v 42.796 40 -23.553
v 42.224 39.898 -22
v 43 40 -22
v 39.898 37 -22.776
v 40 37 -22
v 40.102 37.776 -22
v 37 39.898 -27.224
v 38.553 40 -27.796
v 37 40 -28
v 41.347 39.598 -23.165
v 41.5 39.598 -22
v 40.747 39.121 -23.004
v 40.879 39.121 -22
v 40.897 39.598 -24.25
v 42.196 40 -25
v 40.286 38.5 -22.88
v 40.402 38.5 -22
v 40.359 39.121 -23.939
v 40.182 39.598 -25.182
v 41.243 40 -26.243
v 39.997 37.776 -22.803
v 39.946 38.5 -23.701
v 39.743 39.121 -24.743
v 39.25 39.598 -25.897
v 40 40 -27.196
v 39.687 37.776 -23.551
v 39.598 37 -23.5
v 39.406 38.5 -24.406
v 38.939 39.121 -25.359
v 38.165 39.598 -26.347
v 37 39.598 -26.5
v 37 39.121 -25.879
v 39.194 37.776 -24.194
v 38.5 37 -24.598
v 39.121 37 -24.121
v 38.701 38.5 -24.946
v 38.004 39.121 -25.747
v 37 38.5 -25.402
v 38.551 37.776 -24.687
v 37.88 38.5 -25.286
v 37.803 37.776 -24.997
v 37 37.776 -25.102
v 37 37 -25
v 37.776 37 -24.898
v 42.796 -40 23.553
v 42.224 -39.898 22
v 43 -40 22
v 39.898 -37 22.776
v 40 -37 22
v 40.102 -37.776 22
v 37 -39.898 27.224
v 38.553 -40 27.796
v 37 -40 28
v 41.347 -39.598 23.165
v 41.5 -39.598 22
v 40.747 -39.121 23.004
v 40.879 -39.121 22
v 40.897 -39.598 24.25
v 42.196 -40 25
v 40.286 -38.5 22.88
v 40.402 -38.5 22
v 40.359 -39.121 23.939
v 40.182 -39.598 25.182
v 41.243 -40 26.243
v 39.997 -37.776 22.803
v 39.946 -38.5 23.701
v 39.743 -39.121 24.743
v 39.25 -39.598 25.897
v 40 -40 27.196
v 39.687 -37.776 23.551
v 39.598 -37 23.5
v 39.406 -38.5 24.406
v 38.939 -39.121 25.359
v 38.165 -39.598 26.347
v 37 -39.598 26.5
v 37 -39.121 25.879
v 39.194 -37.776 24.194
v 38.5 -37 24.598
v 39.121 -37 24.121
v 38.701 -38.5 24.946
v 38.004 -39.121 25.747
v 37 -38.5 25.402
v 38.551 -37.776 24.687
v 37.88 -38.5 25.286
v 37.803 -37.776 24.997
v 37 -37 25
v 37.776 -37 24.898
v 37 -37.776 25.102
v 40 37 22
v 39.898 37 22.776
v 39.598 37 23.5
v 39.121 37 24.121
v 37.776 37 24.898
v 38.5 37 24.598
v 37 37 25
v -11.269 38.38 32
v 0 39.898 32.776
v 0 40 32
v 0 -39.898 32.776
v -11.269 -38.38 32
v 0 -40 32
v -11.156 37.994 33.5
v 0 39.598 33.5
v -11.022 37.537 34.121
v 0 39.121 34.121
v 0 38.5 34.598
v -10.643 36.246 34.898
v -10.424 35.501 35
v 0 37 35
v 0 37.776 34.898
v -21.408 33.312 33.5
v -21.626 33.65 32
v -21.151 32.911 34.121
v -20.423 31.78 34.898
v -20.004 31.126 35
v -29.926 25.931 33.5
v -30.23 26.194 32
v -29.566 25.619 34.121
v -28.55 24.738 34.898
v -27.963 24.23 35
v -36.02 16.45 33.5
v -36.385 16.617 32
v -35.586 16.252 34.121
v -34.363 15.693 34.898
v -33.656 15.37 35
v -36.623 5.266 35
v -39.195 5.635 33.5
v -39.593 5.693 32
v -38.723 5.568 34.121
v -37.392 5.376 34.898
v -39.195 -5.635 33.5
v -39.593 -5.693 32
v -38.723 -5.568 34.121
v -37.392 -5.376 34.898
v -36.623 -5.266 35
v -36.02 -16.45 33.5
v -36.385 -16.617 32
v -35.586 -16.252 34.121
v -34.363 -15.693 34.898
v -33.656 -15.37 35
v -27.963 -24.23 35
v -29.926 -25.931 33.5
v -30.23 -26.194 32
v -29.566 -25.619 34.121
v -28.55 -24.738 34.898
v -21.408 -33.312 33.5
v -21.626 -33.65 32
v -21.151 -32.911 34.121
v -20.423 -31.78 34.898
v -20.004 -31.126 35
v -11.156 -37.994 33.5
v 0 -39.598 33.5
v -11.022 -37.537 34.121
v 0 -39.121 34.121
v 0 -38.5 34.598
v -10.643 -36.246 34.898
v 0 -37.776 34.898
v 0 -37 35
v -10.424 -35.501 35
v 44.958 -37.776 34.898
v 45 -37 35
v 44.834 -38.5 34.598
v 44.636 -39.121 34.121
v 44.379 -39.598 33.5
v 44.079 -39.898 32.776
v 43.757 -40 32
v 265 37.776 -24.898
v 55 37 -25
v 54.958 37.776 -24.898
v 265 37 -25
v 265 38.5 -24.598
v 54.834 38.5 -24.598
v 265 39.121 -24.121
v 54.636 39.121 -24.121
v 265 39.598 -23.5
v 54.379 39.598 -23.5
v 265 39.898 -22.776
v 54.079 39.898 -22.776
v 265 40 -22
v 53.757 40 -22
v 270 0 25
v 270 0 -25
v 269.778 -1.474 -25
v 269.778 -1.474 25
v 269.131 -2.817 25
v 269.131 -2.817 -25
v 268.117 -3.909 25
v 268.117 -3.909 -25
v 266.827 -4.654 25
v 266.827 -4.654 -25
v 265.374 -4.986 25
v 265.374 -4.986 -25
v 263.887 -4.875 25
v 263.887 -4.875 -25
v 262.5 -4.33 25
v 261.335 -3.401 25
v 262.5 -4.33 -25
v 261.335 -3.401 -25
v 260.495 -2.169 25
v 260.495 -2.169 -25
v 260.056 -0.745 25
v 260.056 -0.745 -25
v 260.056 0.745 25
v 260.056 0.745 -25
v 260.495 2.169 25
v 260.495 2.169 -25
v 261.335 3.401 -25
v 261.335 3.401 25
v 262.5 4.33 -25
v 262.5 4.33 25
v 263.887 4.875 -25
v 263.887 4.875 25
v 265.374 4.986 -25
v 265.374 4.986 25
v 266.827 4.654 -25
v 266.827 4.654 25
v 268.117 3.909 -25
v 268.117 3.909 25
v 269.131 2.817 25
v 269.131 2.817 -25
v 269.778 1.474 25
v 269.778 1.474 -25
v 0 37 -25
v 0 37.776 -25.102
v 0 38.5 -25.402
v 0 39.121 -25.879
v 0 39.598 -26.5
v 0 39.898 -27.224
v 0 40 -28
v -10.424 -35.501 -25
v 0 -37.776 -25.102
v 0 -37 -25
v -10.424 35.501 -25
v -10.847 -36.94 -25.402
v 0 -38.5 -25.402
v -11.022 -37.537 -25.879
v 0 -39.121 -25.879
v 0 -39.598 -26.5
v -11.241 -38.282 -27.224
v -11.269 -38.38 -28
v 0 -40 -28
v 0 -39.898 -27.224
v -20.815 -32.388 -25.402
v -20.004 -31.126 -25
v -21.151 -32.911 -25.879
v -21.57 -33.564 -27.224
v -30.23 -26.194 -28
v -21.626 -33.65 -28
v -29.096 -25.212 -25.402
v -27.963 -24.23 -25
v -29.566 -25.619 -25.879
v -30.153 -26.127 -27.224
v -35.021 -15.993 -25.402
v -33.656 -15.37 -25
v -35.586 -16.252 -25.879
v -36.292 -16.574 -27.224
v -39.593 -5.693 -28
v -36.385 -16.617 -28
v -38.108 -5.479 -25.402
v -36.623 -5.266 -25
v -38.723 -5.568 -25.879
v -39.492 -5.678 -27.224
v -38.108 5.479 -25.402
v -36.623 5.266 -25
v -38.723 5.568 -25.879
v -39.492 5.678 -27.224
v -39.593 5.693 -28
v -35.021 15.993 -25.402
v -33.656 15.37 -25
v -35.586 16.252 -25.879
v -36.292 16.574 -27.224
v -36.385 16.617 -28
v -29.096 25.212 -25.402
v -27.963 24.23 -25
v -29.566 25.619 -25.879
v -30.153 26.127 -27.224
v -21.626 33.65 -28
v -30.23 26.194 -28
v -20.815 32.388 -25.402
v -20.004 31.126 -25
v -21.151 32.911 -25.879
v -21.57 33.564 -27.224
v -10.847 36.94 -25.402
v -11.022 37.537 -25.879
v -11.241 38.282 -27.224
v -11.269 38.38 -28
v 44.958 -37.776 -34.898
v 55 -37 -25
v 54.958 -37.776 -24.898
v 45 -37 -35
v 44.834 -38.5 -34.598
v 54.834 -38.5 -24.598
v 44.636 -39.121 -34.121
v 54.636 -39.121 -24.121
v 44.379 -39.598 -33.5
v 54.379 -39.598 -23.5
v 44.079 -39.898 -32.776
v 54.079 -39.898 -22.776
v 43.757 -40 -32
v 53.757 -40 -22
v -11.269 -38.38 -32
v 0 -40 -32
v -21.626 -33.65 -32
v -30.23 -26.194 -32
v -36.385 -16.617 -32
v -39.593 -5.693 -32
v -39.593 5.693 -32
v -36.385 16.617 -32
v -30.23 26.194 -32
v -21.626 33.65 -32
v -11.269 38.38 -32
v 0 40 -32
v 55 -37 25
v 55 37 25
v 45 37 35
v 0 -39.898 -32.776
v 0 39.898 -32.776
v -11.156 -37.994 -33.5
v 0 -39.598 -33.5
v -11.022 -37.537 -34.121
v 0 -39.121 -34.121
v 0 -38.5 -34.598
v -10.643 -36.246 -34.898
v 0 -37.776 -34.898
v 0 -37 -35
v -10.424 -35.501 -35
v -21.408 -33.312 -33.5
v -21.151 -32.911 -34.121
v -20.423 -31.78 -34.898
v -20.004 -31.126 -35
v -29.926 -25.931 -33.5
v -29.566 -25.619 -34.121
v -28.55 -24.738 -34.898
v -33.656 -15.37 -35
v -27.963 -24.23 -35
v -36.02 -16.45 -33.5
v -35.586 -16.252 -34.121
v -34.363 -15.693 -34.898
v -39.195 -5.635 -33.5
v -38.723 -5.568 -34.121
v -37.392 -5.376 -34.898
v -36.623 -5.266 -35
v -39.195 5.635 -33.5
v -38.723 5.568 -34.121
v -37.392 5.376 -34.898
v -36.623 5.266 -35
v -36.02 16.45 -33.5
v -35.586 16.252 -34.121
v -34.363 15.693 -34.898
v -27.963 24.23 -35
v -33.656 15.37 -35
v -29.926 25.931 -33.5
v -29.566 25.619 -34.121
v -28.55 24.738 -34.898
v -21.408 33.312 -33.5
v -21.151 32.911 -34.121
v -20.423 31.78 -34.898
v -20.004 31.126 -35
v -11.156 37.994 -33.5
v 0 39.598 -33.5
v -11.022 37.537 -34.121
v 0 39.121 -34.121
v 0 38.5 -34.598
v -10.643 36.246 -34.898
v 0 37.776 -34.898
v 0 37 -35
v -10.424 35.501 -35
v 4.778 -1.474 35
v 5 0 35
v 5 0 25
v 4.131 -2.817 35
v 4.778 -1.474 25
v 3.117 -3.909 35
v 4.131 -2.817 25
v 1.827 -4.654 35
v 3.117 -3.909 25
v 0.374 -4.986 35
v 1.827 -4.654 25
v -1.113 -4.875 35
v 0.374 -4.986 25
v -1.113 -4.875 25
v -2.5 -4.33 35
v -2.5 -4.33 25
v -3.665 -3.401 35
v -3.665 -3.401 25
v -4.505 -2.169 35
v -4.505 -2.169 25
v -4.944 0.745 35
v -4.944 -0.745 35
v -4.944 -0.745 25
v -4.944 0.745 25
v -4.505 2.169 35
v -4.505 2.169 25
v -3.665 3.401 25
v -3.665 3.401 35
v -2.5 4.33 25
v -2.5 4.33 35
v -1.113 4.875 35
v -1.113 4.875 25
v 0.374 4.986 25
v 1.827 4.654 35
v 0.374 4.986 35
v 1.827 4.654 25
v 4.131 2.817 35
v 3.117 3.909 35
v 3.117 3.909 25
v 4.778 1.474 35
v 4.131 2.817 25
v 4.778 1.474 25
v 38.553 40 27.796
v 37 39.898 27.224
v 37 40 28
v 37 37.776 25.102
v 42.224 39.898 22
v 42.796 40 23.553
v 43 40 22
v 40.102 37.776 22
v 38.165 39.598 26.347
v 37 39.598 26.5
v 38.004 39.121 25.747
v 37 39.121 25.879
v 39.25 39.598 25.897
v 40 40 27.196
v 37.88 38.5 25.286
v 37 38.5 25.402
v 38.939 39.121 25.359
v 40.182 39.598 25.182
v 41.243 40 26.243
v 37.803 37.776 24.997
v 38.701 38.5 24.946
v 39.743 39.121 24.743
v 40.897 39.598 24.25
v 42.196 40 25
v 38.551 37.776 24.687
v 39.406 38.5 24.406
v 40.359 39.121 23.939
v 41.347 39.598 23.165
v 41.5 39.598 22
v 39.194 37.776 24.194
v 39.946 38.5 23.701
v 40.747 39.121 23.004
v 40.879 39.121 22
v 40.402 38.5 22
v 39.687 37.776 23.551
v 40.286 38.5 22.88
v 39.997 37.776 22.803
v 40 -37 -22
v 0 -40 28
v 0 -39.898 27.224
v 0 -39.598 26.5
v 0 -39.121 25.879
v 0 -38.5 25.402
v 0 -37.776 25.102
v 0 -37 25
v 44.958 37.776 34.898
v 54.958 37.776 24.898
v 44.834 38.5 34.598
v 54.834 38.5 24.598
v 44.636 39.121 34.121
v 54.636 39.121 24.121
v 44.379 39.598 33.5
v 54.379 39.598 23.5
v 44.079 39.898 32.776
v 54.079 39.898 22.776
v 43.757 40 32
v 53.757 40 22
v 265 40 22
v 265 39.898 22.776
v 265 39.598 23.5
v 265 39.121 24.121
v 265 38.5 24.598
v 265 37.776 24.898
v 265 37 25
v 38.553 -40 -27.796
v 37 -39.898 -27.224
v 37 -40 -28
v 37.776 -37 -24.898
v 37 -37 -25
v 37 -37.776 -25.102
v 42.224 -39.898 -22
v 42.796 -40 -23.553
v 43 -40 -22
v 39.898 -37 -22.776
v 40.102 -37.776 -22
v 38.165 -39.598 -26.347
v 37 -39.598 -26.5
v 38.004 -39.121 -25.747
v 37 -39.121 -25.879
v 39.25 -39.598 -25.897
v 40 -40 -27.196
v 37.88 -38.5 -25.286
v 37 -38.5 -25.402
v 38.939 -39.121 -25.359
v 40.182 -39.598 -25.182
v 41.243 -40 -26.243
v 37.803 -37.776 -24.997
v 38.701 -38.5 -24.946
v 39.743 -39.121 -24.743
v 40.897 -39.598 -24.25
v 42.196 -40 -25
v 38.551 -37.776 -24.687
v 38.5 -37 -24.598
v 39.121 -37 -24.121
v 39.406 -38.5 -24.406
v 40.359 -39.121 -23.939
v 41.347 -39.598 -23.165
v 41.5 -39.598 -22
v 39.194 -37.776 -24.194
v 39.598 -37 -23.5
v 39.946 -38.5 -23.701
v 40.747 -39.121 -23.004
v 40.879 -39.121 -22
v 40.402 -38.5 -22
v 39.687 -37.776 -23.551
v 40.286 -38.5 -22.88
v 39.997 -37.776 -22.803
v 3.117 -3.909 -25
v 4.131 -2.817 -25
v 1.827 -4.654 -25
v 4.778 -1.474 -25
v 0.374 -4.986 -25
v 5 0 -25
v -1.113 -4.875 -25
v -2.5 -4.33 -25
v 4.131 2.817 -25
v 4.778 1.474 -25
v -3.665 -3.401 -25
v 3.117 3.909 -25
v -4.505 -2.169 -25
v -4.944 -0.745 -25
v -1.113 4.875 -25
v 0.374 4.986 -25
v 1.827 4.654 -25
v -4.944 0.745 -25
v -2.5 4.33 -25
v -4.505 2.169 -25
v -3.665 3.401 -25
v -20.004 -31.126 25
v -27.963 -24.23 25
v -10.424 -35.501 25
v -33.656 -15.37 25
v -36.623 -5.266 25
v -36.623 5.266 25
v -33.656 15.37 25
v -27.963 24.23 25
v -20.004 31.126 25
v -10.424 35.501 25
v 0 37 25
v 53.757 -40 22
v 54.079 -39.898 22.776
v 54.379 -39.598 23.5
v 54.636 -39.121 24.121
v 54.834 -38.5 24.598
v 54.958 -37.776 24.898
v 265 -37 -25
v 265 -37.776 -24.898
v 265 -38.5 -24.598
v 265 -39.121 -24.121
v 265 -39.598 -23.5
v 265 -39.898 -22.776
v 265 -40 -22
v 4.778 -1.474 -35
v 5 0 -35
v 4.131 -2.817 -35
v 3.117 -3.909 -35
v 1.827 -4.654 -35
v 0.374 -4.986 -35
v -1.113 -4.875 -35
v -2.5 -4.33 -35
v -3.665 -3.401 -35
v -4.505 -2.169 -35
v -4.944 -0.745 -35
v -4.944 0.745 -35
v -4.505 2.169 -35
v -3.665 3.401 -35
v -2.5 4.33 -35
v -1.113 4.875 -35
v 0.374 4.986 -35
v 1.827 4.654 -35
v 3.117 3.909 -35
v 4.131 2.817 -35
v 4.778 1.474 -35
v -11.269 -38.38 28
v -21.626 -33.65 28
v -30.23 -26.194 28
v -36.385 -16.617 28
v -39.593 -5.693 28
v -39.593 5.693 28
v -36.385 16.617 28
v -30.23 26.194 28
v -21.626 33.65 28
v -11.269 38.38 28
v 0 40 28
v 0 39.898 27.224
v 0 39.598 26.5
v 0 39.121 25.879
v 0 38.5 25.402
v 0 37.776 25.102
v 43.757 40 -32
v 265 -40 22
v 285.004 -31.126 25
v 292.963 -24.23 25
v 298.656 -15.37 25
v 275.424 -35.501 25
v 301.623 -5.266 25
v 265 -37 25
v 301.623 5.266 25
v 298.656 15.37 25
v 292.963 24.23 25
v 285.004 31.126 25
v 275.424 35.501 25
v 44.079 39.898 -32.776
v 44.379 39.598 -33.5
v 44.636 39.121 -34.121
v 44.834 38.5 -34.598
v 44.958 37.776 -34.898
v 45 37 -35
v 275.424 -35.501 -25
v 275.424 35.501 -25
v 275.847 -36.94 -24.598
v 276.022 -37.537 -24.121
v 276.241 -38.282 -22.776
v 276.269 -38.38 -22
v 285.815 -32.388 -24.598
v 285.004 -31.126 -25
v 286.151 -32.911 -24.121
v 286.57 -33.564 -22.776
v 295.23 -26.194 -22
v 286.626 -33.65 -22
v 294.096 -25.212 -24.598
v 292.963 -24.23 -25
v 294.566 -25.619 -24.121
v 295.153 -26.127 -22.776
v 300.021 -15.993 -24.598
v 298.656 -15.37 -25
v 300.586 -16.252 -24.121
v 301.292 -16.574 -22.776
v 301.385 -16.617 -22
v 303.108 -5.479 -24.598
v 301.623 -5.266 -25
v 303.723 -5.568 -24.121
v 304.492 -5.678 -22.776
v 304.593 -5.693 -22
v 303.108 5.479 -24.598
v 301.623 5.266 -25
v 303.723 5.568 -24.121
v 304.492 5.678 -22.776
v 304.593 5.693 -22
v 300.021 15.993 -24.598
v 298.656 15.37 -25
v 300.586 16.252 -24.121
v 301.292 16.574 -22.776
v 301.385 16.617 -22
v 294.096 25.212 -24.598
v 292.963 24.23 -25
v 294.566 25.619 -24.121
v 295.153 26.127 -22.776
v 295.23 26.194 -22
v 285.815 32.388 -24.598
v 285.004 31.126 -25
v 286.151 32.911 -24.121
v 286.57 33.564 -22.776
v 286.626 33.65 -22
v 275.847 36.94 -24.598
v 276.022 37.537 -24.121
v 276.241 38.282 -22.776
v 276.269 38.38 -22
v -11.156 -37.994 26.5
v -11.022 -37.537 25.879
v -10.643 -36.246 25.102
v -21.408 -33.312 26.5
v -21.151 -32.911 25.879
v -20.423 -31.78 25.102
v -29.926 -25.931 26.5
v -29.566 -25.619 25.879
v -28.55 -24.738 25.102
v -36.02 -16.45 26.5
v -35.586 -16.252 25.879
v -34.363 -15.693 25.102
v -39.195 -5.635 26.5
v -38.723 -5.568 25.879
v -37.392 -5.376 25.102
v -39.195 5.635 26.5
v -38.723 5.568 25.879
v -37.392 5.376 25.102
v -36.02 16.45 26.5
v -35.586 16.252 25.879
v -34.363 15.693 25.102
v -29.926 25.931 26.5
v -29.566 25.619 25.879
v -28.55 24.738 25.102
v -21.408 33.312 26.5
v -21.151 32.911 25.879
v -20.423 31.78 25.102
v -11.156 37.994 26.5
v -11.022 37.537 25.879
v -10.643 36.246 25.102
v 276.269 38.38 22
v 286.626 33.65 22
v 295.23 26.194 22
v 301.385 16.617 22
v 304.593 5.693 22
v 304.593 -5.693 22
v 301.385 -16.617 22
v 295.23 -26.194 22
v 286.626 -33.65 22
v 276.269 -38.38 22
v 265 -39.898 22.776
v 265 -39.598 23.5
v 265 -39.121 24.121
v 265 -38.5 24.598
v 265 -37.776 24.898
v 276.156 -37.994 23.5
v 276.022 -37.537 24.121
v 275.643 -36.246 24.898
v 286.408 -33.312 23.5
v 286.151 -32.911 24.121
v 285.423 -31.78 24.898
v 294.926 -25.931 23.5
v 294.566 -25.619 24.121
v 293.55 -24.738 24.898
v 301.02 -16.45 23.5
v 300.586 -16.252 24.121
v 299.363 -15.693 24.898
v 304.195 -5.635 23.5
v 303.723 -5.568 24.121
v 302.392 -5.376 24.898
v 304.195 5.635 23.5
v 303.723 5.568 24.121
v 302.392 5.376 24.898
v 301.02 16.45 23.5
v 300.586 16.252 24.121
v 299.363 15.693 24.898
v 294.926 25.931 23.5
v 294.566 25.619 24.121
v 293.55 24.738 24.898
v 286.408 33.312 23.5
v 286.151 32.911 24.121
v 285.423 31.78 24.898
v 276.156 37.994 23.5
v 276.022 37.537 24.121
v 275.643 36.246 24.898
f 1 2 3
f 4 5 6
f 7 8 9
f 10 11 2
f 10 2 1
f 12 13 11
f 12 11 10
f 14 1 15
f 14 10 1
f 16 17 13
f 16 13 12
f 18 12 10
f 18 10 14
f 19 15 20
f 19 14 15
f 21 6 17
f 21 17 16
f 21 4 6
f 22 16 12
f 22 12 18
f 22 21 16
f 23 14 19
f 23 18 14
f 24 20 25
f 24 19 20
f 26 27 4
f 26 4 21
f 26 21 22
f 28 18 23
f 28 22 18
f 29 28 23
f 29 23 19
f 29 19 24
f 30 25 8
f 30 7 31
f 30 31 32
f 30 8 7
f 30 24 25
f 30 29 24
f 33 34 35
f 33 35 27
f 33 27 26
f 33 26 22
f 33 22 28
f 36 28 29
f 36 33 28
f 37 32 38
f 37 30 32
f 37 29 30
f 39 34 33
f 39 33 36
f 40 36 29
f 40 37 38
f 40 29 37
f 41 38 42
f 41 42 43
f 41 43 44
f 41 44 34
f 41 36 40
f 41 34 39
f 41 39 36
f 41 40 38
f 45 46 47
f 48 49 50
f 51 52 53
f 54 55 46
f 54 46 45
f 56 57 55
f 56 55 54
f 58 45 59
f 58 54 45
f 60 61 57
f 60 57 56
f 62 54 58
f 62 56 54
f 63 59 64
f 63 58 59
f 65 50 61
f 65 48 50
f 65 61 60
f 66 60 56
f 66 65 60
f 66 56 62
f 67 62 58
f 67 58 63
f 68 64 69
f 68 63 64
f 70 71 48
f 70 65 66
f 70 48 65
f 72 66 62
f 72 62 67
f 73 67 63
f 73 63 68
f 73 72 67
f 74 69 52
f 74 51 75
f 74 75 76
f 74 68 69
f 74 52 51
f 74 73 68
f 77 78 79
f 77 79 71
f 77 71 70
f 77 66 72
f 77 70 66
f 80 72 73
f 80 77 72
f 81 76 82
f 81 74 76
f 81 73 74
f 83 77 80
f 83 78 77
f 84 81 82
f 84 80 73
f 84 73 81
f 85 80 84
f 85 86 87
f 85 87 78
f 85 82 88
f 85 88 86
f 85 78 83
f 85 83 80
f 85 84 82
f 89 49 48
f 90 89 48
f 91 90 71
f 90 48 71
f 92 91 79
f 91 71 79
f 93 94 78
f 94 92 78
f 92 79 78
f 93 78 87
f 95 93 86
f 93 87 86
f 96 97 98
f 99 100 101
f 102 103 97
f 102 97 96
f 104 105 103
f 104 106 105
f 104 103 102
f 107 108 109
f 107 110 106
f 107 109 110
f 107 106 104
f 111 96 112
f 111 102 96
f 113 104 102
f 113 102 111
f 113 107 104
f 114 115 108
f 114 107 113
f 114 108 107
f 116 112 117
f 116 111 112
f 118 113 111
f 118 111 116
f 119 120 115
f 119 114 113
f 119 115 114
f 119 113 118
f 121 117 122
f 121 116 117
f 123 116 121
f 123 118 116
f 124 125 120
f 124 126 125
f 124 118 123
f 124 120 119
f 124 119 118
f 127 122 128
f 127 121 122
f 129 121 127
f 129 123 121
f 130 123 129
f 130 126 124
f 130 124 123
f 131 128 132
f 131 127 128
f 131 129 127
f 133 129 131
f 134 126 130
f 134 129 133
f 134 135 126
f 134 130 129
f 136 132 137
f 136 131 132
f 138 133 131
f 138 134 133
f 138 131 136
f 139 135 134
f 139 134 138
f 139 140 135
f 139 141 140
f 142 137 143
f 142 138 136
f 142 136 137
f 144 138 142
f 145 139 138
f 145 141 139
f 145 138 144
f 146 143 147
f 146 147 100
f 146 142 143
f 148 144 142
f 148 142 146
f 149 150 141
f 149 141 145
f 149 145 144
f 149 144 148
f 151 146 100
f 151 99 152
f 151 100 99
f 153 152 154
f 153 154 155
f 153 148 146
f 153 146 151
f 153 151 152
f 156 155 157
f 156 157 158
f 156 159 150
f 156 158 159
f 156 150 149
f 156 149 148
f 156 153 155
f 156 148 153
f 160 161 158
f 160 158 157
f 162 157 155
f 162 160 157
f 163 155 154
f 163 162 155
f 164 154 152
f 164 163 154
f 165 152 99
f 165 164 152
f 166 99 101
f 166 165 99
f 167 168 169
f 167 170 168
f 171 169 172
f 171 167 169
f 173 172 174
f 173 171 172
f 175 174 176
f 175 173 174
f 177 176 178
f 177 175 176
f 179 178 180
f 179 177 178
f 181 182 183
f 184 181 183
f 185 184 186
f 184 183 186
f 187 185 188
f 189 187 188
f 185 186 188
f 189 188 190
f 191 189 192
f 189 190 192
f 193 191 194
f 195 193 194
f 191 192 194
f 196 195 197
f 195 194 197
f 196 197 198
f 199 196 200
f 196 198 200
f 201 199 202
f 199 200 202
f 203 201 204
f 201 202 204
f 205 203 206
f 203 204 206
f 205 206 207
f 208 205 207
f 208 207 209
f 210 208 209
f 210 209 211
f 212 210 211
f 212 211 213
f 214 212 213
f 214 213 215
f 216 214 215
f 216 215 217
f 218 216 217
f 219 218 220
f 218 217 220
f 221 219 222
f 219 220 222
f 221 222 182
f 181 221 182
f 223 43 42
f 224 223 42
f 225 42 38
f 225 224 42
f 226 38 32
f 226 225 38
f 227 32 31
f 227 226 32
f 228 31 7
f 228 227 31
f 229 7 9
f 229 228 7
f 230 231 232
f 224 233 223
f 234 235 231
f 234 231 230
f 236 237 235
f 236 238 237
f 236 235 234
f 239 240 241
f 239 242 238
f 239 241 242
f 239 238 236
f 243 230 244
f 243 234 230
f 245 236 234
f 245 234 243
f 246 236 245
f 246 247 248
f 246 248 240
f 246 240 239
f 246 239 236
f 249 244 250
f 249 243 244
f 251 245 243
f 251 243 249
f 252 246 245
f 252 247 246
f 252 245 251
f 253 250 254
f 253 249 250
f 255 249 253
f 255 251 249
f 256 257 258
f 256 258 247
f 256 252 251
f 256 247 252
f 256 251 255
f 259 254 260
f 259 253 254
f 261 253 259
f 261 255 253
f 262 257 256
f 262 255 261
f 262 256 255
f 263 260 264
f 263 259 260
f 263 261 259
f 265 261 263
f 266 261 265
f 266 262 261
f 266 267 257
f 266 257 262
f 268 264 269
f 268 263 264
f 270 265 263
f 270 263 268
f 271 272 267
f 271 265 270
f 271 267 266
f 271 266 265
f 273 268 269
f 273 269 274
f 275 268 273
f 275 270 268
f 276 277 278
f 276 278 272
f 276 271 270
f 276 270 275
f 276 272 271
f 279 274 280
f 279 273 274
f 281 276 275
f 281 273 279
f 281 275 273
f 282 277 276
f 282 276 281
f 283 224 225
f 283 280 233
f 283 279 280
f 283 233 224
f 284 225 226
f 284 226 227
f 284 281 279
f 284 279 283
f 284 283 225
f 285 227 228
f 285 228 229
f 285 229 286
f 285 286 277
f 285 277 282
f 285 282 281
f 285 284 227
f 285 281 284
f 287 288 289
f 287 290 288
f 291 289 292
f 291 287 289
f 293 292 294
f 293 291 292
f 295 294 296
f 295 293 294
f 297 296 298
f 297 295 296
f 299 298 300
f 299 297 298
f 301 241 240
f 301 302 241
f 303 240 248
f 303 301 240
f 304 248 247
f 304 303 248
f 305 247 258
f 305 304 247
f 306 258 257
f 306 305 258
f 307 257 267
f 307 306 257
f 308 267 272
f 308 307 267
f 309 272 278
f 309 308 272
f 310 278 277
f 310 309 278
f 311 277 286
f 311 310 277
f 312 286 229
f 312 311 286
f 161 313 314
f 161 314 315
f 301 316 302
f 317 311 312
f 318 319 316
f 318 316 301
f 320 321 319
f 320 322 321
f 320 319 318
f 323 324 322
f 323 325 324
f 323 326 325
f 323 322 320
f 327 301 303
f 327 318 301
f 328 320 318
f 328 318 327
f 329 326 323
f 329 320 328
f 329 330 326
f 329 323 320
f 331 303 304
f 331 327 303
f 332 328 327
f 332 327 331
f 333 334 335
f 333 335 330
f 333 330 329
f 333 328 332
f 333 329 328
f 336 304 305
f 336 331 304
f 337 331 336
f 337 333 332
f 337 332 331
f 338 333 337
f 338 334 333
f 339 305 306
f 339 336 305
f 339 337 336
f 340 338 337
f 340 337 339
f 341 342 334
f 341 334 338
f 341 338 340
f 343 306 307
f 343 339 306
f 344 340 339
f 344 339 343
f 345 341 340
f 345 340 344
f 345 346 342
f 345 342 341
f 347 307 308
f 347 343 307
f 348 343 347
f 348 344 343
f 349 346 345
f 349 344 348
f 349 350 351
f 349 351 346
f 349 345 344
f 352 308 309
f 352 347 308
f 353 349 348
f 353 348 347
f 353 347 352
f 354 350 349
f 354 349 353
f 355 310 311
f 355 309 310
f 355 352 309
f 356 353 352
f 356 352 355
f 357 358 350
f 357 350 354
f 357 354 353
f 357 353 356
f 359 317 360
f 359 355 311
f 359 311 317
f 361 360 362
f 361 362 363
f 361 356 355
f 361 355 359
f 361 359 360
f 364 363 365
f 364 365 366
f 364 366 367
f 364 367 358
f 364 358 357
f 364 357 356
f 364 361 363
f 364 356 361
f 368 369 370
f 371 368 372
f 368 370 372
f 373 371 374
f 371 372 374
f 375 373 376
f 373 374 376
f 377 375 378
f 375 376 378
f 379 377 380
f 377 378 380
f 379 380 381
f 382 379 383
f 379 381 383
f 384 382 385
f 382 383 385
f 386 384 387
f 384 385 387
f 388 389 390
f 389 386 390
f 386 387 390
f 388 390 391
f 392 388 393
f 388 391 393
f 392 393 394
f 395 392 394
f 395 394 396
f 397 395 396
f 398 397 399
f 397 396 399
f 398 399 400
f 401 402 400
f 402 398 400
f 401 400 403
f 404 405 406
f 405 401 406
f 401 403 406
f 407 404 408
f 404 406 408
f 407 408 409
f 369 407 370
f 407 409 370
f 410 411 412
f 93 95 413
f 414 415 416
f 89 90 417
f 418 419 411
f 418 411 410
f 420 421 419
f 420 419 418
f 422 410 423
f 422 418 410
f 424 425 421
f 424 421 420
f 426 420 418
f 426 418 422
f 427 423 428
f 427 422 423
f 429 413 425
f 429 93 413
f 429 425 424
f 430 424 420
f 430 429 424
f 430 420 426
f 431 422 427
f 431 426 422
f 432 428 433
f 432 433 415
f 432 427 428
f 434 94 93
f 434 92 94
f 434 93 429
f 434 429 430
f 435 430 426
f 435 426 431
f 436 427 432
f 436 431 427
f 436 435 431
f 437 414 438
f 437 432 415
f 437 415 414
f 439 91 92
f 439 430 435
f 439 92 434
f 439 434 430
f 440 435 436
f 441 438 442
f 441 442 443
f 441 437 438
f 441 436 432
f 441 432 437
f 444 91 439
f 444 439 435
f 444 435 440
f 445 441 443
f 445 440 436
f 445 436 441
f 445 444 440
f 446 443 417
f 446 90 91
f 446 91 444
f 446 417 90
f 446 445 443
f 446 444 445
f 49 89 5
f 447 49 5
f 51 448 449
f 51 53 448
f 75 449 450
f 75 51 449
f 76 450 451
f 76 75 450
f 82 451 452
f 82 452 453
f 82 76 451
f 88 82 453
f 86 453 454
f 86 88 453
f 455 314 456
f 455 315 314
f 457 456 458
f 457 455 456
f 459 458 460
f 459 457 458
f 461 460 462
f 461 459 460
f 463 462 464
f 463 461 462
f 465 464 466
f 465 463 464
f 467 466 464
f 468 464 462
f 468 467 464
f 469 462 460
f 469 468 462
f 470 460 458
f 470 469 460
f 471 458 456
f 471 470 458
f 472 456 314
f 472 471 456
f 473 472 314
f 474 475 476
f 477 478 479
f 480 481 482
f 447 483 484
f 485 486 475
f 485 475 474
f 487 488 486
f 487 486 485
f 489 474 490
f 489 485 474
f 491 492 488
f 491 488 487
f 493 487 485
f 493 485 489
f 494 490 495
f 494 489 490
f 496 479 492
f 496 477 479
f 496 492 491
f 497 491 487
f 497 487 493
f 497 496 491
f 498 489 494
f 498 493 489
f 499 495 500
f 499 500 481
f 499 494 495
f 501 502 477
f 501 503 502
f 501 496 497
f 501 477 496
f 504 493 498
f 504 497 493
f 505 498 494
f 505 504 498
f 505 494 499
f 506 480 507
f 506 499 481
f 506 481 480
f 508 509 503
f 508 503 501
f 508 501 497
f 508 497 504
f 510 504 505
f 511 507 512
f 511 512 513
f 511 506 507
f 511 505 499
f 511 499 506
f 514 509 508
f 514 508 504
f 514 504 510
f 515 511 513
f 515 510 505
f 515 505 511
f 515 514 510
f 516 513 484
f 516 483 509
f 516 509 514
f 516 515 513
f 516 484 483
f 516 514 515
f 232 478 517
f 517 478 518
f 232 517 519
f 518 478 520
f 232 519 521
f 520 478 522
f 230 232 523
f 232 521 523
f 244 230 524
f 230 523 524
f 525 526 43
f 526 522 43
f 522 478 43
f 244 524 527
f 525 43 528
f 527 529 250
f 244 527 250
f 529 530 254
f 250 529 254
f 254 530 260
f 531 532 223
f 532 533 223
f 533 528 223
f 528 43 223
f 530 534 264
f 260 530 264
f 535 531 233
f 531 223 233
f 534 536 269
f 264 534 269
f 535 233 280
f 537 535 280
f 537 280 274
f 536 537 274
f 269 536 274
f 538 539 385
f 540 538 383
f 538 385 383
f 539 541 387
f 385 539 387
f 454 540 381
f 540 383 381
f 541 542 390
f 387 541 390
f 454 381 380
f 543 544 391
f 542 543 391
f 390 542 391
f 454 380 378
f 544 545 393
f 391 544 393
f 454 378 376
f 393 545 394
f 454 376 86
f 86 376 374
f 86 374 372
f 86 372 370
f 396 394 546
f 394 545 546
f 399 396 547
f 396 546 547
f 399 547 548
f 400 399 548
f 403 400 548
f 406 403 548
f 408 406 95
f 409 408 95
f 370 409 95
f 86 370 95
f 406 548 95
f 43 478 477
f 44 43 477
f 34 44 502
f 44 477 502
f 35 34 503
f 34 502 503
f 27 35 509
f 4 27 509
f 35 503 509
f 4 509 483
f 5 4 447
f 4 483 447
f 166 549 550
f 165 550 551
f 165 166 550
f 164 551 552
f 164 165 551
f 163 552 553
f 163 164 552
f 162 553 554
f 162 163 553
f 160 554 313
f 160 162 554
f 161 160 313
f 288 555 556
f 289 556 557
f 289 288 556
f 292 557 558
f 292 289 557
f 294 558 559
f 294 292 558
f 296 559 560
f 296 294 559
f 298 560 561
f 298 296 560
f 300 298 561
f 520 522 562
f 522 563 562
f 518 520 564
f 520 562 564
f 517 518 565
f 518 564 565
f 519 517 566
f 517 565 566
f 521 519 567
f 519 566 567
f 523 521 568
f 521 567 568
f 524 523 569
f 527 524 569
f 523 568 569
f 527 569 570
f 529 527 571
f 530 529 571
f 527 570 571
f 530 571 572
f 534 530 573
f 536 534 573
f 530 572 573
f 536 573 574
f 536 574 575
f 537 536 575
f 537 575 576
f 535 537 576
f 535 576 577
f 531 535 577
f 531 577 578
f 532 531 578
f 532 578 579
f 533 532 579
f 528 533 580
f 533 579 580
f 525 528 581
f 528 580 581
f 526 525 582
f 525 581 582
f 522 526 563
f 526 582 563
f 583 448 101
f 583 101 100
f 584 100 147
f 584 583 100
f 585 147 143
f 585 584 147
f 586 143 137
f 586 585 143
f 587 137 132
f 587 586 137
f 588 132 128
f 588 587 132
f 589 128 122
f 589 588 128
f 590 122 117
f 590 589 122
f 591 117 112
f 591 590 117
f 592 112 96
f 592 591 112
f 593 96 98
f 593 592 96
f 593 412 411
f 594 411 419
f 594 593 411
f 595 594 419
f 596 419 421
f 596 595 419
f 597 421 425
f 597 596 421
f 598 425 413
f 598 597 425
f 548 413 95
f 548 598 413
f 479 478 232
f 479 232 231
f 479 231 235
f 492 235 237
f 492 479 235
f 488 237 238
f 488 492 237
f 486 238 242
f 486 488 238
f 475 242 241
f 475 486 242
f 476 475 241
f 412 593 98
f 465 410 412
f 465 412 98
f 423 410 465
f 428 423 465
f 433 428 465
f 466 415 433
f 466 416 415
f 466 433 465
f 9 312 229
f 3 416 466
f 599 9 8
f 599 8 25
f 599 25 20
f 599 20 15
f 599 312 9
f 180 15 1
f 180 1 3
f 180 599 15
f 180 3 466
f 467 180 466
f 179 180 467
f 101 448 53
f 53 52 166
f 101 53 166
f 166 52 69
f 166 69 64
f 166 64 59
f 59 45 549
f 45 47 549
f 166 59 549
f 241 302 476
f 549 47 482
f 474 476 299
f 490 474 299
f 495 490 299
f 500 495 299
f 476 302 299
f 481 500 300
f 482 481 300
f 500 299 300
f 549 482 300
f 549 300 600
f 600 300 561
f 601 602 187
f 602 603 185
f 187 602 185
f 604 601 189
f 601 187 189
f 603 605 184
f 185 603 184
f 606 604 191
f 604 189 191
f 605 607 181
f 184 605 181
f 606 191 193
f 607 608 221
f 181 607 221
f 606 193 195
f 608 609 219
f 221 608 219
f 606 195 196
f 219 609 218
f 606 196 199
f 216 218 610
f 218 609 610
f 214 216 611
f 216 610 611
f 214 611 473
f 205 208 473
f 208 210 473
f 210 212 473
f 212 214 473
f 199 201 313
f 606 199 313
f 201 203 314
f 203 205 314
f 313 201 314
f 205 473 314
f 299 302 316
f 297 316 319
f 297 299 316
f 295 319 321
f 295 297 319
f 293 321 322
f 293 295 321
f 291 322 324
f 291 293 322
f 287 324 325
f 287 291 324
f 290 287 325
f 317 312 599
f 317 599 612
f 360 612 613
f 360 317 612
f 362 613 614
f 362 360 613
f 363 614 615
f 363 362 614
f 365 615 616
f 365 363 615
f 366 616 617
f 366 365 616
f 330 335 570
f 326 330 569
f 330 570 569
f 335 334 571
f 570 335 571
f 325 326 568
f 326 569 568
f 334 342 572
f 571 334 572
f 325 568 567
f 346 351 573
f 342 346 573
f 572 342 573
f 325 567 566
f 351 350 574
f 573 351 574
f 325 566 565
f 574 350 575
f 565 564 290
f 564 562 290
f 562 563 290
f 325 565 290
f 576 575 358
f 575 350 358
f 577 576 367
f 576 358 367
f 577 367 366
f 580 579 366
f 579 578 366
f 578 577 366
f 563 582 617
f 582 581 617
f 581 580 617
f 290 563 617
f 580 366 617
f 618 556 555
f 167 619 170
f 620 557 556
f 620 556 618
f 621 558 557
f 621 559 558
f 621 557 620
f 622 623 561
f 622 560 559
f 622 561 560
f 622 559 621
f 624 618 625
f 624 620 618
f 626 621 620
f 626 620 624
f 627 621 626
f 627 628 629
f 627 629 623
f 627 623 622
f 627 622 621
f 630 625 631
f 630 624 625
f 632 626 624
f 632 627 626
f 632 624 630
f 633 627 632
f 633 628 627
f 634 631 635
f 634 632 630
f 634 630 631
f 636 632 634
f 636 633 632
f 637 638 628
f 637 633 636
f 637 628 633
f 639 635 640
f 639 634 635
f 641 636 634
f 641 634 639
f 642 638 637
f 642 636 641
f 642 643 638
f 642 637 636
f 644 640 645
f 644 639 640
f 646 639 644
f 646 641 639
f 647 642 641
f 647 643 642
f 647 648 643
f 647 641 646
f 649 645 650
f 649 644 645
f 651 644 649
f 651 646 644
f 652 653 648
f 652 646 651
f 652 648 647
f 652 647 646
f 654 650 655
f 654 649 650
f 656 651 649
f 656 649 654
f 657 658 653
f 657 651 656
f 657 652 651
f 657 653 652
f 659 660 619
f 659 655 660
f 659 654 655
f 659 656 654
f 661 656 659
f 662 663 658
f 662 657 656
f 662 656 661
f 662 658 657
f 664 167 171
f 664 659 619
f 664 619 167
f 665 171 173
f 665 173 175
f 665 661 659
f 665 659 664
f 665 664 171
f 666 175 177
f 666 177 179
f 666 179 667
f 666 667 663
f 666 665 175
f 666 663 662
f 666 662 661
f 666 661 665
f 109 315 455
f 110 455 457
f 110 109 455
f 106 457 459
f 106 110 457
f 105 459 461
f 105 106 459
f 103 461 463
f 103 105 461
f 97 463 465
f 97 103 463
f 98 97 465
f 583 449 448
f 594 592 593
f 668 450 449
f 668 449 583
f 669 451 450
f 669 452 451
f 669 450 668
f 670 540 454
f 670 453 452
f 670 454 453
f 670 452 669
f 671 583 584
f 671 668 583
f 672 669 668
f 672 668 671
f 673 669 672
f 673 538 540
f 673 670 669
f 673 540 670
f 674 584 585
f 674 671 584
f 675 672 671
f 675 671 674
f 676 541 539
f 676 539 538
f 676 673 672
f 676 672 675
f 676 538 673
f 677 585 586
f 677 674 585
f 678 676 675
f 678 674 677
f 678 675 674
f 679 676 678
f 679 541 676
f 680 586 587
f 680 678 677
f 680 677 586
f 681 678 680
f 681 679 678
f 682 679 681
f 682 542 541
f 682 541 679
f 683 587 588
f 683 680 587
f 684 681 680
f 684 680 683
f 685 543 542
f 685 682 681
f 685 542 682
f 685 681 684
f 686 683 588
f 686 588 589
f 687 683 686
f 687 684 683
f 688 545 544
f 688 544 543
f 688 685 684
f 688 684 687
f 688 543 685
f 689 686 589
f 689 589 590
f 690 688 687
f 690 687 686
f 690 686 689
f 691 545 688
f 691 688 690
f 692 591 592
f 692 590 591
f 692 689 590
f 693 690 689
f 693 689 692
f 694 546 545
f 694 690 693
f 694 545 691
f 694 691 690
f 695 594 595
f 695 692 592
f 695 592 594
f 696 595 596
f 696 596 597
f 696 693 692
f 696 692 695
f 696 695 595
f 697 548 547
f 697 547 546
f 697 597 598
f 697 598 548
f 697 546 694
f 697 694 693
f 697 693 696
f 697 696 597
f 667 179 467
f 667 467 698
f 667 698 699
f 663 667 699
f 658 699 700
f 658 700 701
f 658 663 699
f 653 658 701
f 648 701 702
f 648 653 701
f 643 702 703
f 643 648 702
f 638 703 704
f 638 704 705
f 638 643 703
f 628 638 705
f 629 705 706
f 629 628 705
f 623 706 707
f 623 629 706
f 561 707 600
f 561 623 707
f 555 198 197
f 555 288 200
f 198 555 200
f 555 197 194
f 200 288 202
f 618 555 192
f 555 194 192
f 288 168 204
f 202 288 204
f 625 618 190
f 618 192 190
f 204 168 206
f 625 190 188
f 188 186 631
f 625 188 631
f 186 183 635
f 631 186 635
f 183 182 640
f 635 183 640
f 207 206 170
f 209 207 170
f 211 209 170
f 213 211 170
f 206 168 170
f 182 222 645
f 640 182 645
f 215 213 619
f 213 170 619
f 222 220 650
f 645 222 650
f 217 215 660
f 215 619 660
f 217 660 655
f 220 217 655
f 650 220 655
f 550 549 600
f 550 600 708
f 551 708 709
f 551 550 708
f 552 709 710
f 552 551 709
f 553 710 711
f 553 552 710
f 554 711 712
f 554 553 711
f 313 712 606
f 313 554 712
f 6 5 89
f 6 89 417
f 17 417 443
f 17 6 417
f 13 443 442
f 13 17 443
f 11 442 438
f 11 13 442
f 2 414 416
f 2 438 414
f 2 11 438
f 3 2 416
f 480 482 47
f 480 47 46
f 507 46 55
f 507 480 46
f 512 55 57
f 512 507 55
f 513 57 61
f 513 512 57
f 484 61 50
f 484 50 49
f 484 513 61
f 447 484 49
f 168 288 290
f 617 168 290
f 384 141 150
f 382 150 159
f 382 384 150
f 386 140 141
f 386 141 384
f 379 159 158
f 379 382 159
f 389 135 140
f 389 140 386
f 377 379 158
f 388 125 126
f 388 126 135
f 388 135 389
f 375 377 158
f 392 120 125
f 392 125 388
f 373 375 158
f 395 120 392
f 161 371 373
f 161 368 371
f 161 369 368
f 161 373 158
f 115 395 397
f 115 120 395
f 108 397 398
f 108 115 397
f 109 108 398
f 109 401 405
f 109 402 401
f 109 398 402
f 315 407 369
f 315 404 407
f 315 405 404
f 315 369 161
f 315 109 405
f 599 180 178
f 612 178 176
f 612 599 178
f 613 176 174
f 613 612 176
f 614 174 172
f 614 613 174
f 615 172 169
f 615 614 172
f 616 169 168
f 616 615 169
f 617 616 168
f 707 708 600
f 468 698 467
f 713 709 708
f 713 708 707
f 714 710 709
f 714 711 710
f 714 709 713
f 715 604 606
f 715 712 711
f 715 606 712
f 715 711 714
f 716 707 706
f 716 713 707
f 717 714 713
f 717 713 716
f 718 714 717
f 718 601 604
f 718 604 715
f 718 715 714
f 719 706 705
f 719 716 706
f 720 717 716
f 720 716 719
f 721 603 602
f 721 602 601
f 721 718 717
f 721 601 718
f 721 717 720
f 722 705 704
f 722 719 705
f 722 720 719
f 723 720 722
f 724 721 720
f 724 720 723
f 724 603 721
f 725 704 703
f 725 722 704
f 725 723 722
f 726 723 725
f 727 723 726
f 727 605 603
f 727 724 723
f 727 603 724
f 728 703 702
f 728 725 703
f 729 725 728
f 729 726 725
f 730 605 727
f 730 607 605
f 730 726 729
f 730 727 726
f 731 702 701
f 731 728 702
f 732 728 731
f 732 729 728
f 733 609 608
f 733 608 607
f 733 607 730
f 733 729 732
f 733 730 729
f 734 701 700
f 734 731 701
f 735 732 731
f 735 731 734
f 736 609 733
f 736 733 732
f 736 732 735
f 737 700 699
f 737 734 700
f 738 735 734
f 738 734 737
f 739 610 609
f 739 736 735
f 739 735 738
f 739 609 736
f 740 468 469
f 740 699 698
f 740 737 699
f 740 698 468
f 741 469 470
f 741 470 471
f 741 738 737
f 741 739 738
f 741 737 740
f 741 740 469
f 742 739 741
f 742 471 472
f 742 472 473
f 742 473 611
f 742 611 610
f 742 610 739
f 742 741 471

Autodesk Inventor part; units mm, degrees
ref_plane "YZ Plane" through (0, 0, 0) normal (1, 0, 0) x (0, 1, 0)
ref_plane "XZ Plane" through (0, 0, 0) normal (0, 1, 0) x (-1, 0, 0)
ref_plane "XY Plane" through (0, 0, 0) normal (0, 0, 1) x (1, 0, 0)
sketch "Sketch1" plane through (0, 0, 0) normal (0, 0, 1) x (1, 0, 0)
  arc A0 (0, 40) -> (0, -40) centre (0, 0) ccw
  arc A1 (265, -40) -> (265, 40) centre (265, 0) ccw
  line L0 (0, 0) -> (265, 0) construction
  line L1 (0, 40) -> (265, 40)
  line L2 (0, -40) -> (265, -40)
  arc A2 (40, 0) -> (0, 40) centre (0, 0) ccw construction
  arc A3 (0, -40) -> (40, 0) centre (0, 0) ccw construction
  arc A4 (225, 0) -> (265, -40) centre (265, 0) ccw construction
  arc A5 (265, 40) -> (225, 0) centre (265, 0) ccw construction
  circle A6 centre (0, 0) radius 5
  circle A7 centre (265, 0) radius 5
  dimension "d0" = 80
  dimension "d1" = 80
  dimension "d2" = 265
  dimension "d3" = 10
  dimension "d4" = 10
extrude "Extrusion1" add sketch "Sketch1" along normal mid plane 70
sketch "Sketch2" plane through (0, 40, 35) normal (0, 1, 0) x (1, 0, 0)
  line L0 (-40, 0) -> (0, 0) construction
  line L1 (-40, 0) -> (45, 0) construction
  line L2 (45, 70) -> (45, 69.4311) construction
  line L3 (305, 70) -> (305, 0) construction
  line L4 (55, 10) -> (305, 10) construction
  line L5 (305, 10) -> (305, 60) construction
  line L6 (305, 60) -> (55, 60) construction
  line L7 (45, 60) -> (45, 10) construction
  line L8 (0, 70) -> (265, 70) construction
  line L9 (265, 0) -> (0, 0) construction
  line L10 (45, 60) -> (305, 60) construction
  line L11 (305, 60) -> (305, 70)
  line L12 (305, 70) -> (45, 70)
  line L13 (45, 70) -> (45, 60) construction
  line L14 (45, 10) -> (305, 10) construction
  line L15 (305, 10) -> (305, 0)
  line L16 (305, 0) -> (45, 0)
  line L17 (45, 0) -> (45, 0)
  line L18 (55, 60) -> (45, 70)
  line L19 (55, 10) -> (45, 0)
  line L20 (55, 60) -> (305, 60)
  line L21 (305, 10) -> (50, 10)
  line L22 (-40, 70) -> (-40, 0) projected
  line L23 (-40, 10) -> (40, 10)
  line L24 (40, 10) -> (40, 60)
  line L25 (40, 60) -> (-40, 60)
  line L26 (-40, 60) -> (-40, 10)
  point P0 (0, 35)
  point P1 (45, 70)
  point P2 (45, 0)
  point P3 (55, 10)
  dimension "d7" = 85
  dimension "d8" = 10
  dimension "d9" = 10
  dimension "d10" = 10
  dimension "d11" = 10
  dimension "d12" = 10
  dimension "d13" = 10
  dimension "d14" = 80
extrude "Extrusion2" cut sketch "Sketch2" against normal through all
fillet "Fillet1" radius 3 26 edges at (305, 0, 25) (160, -40, 25) (160, 40, 25) (305, 0, -25) (160, -40, -25) (160, 40, -25) (-40, 0, 35) (22.5, -40, 35) (22.5, 40, 35) (-40, 0, 25) (20, -40, 25) (20, 40, 25) (-40, 0, -25) (20, -40, -25) (20, 40, -25) (-40, 0, -35) (22.5, -40, -35) (22.5, 40, -35) (40, 40, 0) (40, -40, 0) (50, -40, 30) (50, 40, 30) (50, 40, -30) (50, -40, -30) (40, 0, -25) (40, 0, 25)
equation "\"d11\" = d10"
equation "\"d12\" = d10"
equation "\"d13\" = d12"
properties part number "Arm1"
